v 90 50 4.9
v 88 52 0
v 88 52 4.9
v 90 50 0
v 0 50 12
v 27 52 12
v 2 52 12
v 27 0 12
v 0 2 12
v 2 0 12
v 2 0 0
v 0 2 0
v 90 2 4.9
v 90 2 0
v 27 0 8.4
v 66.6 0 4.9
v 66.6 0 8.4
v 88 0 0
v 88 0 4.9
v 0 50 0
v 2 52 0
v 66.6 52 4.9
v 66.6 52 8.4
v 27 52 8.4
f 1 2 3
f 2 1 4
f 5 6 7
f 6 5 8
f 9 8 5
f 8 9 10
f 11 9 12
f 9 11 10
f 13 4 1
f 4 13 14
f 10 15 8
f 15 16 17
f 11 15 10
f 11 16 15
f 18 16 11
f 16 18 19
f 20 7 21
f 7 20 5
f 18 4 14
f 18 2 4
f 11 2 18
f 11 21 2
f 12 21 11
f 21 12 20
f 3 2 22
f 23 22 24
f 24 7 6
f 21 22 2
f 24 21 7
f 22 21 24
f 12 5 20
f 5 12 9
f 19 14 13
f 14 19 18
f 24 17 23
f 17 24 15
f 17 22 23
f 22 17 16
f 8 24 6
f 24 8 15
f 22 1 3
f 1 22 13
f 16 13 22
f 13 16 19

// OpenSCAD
$fn = 32;

// ----------------------------------------------------------------------
// Stepped bar: twostep, 90 x 52 x 12/4.9 mm
// ----------------------------------------------------------------------

// --- parameters (mm) ---
bar_l = 90;               // bar length, X
bar_w = 52;               // bar width, Y
plate_t = 12;             // thickness of the thick zone, Z
thin_t = 4.9;             // thickness of the thin zone
corner_c = 2;             // corner chamfer of the bar
step_cut = 7.1;           // material removed from the thin zone
stair1_x = 27;            // position of the first stair
stair2_x = 66.6;          // position of the second stair
mid_t = 8.4;              // thickness of the middle zone
depth_1 = 3.6;            // depth of cut 1 from the top face
depth_2 = 7.1;            // depth of cut 2 from the top face

profile = [[2, 0], [88, 0], [90, 2], [90, 50], [88, 52], [2, 52], [0, 50], [0, 2]];  // primary outline, 8 points, counter clockwise
void_1 = [[27, -1], [66.6, -1], [66.6, 53], [27, 53]];  // first stair, 4 points
void_2 = [[66.6, -1], [91, -1], [91, 53], [66.6, 53]];  // second stair, 4 points

// --- the one profile operation ---
difference() {
  linear_extrude(height = plate_t) polygon(points = profile);
  translate([0, 0, plate_t - depth_1])
    linear_extrude(height = depth_1 + 1) polygon(points = void_1);
  translate([0, 0, plate_t - depth_2])
    linear_extrude(height = depth_2 + 1) polygon(points = void_2);
}
